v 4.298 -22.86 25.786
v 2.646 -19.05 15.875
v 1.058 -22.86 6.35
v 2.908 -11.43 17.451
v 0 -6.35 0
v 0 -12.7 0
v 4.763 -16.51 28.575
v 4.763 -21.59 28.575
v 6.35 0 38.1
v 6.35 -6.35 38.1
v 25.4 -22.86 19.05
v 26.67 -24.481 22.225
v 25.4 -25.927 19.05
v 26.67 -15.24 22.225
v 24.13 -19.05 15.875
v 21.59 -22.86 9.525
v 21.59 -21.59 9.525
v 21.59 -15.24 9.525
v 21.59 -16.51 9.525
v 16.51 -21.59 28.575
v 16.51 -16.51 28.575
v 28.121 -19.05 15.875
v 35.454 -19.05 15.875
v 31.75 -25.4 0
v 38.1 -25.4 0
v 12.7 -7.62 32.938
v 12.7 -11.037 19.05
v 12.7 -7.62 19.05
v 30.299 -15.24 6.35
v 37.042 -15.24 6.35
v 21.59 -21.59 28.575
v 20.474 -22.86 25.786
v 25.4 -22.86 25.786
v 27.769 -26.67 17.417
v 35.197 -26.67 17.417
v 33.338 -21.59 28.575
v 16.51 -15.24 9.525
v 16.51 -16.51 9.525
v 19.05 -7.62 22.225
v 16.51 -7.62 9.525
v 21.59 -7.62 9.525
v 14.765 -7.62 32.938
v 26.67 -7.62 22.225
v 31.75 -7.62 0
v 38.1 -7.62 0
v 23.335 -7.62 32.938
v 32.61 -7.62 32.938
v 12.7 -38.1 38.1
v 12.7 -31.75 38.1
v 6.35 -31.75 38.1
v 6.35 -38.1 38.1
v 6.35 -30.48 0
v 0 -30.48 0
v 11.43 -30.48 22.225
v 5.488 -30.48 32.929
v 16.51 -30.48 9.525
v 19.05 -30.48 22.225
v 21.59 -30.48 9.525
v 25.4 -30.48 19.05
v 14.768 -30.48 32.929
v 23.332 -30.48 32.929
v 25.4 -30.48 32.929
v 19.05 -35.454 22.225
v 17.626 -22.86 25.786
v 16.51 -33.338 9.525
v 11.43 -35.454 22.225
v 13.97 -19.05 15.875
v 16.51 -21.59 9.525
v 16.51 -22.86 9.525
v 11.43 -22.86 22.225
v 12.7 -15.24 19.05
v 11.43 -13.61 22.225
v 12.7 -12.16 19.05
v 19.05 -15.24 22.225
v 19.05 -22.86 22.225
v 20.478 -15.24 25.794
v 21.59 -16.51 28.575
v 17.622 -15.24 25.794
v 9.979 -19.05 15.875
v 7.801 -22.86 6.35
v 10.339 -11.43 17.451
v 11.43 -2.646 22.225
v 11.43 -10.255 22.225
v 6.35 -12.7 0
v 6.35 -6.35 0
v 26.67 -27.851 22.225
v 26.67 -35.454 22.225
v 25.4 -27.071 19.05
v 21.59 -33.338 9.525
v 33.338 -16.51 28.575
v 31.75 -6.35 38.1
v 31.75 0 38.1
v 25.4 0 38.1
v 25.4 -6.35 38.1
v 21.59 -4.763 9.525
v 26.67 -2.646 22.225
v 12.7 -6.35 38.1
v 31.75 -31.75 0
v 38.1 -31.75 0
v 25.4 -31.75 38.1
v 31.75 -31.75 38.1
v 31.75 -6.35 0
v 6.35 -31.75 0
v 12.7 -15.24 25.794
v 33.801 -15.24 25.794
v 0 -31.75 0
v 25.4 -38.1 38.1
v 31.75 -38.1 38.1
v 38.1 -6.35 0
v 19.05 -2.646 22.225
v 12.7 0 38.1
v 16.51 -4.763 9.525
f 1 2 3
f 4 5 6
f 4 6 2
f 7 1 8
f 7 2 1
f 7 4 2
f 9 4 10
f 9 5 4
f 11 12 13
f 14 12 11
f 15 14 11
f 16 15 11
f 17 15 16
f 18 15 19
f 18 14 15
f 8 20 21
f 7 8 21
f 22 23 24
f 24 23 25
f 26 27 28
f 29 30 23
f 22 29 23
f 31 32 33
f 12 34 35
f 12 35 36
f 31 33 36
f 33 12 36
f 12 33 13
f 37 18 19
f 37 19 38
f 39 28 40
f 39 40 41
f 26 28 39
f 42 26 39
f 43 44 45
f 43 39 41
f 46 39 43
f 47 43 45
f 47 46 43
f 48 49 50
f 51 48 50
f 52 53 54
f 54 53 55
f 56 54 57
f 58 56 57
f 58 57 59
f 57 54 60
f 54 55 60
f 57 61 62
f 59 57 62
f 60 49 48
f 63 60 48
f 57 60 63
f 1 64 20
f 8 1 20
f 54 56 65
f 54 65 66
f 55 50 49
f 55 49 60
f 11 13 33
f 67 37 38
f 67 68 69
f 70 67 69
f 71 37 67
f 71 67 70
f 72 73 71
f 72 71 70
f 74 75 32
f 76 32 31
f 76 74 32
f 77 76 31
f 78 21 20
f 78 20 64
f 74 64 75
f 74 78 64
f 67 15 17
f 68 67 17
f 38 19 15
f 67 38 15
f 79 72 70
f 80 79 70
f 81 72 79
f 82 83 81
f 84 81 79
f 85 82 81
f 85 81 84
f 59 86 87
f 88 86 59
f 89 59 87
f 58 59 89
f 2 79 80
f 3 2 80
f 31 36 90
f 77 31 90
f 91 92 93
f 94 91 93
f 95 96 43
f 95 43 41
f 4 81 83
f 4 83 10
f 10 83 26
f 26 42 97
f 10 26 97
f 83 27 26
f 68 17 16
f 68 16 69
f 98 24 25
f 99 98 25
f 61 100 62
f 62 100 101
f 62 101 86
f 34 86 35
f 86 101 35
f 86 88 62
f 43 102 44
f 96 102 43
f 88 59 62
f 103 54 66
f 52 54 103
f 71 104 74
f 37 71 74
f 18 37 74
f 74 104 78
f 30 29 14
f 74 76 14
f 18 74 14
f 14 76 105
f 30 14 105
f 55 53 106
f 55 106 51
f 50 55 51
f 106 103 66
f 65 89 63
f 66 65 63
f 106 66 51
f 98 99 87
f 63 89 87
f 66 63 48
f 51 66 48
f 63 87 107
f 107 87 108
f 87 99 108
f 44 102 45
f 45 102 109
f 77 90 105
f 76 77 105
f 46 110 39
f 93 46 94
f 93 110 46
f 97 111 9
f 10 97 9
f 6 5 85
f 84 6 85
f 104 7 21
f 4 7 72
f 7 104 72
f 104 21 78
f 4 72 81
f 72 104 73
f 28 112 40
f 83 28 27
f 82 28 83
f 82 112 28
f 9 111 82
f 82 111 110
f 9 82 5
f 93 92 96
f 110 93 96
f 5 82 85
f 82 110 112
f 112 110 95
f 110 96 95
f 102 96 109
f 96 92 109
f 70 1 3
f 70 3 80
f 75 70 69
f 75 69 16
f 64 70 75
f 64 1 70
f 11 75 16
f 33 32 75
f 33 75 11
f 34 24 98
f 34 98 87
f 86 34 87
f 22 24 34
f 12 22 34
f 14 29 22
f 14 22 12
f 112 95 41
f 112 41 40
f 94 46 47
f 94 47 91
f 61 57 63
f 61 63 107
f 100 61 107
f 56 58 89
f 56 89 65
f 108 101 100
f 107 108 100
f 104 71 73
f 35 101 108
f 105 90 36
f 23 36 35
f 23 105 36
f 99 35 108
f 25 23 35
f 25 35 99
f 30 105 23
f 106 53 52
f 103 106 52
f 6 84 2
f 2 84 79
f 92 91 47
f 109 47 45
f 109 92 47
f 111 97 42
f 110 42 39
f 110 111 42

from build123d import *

# Parameters (mm, degrees)
F1_DEPTH = 38.1
F5_DEPTH = 38.1
F6_DEPTH = 38.1
F7_W     = 25.4
F7_H     = 7.62
F8_DEPTH = 38.1


with BuildPart() as f1:
    # F0 (on Front) → F1 (new body)
    with BuildSketch(Plane.XZ):
        Polygon((6.35, 38.1), (0, 0), (6.35, 0), (11.43, 22.225), (16.51, 9.525), (21.59, 9.525), (26.67, 22.225), (31.75, 0), (38.1, 0), (31.75, 38.1), (25.4, 38.1), (19.05, 22.225), (12.7, 38.1), align=None)
        Polygon((0, 38.1), (0, 0), (6.35, 38.1), align=None)
        Polygon((11.43, 22.225), (6.35, 0), (31.75, 0), (26.67, 22.225), (21.59, 9.525), (16.51, 9.525), align=None)
        Polygon((25.4, 38.1), (12.7, 38.1), (19.05, 22.225), align=None)
        Polygon((31.75, 38.1), (38.1, 0), (38.1, 38.1), align=None)
    extrude(amount=F1_DEPTH)

    # F4 (on offset) → F5 (cut)
    with BuildSketch(Plane.YZ.offset(38.1)):
        Polygon((-31.75, 0), (-38.1, 38.1), (-38.1, 0), align=None)
        Polygon((-11.43, 17.450867), (-6.35, 38.1), (-31.75, 38.1), (-26.67, 17.417177), (-21.59, 28.575), (-16.51, 28.575), align=None)
        Polygon((-25.4, 0), (-12.7, 0), (-19.05, 15.875), align=None)
        Polygon((-6.35, 0), (0, 0), (0, 38.1), align=None)
    extrude(amount=-F5_DEPTH, mode=Mode.SUBTRACT)

    # F0 (on Front) → F6 (cut)
    with BuildSketch(Plane.XZ):
        Polygon((31.75, 38.1), (38.1, 0), (38.1, 38.1), align=None)
        Polygon((25.4, 38.1), (12.7, 38.1), (19.05, 22.225), align=None)
        Polygon((0, 38.1), (0, 0), (6.35, 38.1), align=None)
        Polygon((11.43, 22.225), (6.35, 0), (31.75, 0), (26.67, 22.225), (21.59, 9.525), (16.51, 9.525), align=None)
    extrude(amount=F6_DEPTH, mode=Mode.SUBTRACT)

    # F7 (on offset) → F8 (cut)
    with BuildSketch(Plane.XY.offset(38.1)):
        with Locations((12.7, -26.67)):
            Rectangle(F7_W, F7_H)
        with Locations((25.4, -11.43)):
            Rectangle(F7_W, F7_H)
    extrude(amount=-F8_DEPTH, mode=Mode.SUBTRACT)


solid = f1.part
